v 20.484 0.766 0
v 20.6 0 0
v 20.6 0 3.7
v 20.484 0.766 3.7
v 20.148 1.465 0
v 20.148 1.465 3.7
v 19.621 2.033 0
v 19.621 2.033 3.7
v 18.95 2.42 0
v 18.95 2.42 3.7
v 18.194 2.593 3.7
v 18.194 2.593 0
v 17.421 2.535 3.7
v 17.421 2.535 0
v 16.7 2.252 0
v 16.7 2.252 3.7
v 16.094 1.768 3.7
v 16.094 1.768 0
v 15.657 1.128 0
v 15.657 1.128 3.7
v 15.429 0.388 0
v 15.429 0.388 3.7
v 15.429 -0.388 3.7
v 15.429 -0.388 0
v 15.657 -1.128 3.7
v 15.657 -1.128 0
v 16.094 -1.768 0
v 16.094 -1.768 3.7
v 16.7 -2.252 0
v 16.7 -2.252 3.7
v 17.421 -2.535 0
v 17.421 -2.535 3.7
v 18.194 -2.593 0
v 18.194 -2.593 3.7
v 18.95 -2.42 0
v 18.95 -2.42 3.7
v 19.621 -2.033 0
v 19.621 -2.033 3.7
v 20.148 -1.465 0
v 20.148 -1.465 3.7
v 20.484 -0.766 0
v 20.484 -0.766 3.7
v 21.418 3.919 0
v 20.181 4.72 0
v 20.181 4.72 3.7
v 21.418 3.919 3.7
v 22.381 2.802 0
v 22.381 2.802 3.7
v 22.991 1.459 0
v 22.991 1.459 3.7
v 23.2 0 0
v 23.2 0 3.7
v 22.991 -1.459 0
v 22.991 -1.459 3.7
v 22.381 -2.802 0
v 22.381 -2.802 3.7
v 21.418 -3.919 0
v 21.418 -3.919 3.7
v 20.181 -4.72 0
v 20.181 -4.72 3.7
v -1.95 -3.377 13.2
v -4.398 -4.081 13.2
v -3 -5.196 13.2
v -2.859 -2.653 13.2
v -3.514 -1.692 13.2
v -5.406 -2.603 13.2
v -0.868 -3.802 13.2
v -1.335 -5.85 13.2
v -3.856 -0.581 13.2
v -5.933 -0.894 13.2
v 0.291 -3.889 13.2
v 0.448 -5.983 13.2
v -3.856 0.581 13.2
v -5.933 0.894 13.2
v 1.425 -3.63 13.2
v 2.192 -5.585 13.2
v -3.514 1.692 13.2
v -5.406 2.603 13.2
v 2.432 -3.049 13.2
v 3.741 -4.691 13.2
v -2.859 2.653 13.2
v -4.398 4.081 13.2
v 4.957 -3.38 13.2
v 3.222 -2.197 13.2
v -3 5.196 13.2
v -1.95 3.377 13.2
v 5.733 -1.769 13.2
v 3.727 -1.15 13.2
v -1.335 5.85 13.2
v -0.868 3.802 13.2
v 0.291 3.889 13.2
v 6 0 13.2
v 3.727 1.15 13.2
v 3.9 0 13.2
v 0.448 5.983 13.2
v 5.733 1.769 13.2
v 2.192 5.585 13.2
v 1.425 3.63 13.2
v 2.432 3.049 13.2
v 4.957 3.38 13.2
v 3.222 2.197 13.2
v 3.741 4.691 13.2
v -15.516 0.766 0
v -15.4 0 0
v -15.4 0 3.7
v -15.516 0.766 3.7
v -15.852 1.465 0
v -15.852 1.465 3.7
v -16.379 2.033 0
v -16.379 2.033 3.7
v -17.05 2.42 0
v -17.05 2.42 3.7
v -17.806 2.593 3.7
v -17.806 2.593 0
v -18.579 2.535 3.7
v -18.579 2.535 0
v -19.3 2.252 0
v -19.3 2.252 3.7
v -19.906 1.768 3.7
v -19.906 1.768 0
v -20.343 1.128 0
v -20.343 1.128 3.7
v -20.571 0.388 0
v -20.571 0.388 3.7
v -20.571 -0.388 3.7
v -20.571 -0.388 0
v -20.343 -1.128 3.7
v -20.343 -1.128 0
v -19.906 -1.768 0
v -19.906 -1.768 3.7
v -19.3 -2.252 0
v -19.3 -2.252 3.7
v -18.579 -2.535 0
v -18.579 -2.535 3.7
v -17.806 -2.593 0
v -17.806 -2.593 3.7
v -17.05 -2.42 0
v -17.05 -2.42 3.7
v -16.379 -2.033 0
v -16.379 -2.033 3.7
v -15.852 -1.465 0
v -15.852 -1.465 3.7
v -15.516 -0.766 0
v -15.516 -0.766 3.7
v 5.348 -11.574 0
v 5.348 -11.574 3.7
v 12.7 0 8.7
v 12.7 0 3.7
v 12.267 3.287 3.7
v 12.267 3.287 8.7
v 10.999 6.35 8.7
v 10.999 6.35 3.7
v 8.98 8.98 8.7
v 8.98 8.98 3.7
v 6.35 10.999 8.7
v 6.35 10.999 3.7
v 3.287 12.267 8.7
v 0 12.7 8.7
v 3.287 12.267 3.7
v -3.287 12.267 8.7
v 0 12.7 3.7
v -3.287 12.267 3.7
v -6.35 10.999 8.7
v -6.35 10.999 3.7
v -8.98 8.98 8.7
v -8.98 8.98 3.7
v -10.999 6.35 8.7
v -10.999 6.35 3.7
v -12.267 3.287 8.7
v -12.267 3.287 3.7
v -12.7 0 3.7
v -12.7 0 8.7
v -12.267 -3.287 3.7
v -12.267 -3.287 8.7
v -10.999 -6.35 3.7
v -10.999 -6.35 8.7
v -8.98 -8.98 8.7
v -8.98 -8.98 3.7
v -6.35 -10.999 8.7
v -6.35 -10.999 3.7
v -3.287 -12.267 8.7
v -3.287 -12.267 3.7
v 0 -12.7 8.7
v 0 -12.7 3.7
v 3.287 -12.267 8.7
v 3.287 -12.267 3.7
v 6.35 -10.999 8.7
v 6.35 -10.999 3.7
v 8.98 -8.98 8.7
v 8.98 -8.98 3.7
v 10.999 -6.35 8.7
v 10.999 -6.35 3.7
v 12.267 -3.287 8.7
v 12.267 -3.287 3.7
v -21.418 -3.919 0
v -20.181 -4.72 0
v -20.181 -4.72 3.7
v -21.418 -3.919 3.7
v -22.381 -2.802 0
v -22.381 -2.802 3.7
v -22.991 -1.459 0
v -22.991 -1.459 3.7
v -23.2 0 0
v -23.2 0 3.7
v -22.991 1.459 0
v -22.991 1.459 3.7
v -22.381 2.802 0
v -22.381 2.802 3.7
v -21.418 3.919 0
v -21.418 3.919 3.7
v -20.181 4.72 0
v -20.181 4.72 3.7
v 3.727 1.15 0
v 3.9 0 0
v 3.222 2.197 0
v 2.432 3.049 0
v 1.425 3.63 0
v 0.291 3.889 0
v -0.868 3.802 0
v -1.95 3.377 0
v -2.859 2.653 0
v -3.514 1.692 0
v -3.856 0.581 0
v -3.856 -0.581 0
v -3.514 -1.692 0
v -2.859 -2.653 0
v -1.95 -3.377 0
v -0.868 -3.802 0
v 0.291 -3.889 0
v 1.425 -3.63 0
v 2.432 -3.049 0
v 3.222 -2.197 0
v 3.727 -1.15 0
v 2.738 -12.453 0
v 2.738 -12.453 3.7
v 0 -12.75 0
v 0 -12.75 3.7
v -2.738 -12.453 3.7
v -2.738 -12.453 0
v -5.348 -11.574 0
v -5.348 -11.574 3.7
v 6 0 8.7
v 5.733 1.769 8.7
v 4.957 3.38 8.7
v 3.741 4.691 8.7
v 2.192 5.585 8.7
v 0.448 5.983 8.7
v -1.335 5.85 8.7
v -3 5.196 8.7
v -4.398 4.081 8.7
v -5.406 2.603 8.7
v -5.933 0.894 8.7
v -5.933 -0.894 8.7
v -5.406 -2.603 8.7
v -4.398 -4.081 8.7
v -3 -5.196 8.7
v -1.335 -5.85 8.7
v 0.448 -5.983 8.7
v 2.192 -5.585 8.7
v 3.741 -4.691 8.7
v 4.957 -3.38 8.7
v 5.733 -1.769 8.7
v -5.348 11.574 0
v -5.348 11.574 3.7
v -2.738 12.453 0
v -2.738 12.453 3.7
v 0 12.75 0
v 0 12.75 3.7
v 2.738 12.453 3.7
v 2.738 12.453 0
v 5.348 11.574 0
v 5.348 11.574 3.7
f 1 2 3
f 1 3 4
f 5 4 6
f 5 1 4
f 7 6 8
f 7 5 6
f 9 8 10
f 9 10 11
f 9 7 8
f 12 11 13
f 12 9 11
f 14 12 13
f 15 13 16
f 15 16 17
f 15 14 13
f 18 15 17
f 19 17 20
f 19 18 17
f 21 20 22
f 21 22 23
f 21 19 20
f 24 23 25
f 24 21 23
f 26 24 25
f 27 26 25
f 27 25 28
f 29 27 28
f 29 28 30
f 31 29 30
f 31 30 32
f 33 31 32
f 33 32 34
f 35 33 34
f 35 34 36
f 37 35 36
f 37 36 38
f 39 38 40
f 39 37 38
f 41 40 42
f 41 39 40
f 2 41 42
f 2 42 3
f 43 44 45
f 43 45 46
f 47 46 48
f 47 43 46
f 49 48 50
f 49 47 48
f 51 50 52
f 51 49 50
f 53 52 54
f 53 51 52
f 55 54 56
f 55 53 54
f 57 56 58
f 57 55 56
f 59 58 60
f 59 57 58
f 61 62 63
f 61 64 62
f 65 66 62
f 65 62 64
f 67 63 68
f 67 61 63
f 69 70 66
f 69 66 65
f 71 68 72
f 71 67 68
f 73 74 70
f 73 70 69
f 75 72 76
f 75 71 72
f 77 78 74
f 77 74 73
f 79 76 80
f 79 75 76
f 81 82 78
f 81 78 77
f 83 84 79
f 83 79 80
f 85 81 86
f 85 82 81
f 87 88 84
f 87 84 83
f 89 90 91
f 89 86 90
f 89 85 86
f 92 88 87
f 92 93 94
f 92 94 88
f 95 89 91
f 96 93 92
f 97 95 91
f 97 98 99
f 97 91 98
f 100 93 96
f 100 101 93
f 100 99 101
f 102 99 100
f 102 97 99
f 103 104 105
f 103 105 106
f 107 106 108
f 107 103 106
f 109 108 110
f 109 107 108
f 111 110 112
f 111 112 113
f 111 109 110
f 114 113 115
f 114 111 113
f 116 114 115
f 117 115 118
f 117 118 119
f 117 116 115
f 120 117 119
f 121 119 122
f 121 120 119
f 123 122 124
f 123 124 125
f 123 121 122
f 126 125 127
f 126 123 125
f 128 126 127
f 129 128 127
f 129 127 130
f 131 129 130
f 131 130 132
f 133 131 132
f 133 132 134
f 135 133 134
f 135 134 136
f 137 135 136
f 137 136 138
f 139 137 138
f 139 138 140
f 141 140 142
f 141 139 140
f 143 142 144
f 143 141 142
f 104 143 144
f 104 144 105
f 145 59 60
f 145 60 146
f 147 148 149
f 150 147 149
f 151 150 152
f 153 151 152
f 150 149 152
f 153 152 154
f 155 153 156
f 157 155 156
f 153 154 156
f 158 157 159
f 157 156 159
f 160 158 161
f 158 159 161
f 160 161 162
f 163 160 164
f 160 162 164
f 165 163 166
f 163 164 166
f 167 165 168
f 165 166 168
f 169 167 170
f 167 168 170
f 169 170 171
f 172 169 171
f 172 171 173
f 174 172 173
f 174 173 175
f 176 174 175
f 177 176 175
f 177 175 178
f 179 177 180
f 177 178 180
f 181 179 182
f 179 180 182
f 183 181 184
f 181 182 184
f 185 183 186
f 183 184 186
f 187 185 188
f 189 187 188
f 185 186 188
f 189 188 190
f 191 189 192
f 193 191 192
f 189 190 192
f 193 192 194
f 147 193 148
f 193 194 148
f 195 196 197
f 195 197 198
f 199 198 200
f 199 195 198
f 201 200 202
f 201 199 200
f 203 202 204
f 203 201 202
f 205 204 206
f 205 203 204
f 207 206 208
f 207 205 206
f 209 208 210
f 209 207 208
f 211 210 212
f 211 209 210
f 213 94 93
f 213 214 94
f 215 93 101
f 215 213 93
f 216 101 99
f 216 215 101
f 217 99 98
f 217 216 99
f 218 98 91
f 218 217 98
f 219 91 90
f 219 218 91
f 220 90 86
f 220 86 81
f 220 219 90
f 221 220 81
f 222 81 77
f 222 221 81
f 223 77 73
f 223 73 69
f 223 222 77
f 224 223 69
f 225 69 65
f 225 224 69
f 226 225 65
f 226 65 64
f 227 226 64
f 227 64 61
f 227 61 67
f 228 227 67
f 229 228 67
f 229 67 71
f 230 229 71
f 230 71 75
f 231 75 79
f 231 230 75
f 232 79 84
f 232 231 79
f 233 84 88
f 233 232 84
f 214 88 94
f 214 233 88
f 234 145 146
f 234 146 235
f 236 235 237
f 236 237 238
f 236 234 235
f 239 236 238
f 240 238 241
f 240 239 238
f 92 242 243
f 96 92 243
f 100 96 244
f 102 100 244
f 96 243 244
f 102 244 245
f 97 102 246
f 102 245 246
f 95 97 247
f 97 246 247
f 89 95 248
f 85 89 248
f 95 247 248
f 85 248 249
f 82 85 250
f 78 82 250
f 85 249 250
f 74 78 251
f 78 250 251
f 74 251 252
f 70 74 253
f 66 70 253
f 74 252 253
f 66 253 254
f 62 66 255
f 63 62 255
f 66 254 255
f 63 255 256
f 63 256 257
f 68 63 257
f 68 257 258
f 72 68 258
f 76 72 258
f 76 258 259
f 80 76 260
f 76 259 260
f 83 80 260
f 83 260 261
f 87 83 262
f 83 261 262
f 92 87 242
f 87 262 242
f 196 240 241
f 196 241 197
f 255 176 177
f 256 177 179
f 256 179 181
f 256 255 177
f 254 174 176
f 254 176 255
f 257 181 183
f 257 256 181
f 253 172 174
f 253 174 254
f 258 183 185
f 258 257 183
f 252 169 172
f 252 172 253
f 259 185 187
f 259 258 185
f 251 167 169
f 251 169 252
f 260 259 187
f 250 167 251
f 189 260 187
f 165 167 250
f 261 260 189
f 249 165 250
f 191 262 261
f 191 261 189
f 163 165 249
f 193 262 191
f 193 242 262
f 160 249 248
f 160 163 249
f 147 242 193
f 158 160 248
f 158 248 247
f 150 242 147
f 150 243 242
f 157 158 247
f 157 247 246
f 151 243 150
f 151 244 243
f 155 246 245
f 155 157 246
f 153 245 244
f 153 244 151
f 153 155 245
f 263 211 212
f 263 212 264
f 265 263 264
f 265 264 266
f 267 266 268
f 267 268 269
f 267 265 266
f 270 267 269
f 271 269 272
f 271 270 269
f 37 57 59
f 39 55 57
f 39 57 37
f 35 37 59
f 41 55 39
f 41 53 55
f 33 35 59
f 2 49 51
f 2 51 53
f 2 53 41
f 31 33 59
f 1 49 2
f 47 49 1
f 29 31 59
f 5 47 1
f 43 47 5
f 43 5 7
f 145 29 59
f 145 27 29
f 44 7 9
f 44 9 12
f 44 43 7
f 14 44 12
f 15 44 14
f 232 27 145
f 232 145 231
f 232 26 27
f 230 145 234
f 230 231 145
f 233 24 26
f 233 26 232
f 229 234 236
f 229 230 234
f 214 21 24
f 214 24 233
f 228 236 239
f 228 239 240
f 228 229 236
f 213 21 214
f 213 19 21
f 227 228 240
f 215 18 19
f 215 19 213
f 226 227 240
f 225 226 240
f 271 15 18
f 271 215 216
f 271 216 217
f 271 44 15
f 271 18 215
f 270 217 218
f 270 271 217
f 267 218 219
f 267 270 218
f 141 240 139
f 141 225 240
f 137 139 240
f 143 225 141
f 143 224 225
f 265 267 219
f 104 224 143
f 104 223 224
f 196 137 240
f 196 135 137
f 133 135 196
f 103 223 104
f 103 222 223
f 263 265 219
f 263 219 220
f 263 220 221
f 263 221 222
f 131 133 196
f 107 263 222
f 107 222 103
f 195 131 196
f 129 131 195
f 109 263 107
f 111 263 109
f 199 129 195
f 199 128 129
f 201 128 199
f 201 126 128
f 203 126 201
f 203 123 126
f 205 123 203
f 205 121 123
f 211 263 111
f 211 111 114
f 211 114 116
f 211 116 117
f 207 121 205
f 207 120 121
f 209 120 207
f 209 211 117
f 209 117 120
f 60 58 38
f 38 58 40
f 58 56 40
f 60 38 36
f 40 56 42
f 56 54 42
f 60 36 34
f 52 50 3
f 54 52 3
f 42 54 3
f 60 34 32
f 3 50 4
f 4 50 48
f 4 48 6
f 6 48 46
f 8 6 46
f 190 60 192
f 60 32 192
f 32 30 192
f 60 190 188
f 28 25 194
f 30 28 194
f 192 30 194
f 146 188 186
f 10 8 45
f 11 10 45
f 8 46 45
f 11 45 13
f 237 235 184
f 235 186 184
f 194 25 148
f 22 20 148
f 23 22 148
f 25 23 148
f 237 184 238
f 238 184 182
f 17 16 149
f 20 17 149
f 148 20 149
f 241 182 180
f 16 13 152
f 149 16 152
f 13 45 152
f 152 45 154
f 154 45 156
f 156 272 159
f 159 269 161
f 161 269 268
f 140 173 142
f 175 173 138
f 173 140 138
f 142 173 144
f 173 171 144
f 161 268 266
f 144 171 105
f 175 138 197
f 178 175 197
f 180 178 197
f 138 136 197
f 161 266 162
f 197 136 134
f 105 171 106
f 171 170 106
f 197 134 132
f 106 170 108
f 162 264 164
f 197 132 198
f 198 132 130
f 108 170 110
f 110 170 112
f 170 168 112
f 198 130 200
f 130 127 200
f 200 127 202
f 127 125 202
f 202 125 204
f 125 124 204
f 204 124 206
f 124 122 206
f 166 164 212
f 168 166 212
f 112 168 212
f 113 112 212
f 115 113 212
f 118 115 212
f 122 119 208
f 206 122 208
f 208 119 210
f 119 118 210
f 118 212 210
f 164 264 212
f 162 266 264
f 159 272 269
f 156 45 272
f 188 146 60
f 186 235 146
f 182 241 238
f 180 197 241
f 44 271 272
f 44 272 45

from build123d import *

# Parameters (mm, degrees)
SKETCH_2_R      = 2.6
SKETCH_2_R_2    = 3.9
EXTRUDE_1_DEPTH = 3.7
SKETCH_3_R      = 12.7
SKETCH_3_R_2    = 3.9
EXTRUDE_2_DEPTH = 5
SKETCH_4_R      = 6
SKETCH_4_R_2    = 3.9
EXTRUDE_3_DEPTH = 4.5


with BuildPart() as part:
    # 草圖2 → 填料-伸長1 (new body)
    with BuildSketch(Plane.XY):
        with BuildLine():
            Line((-20.181106134, 4.72046354), (-5.347916667, 11.574207849))
            ThreePointArc((-5.347916667, 11.574207849), (0, 12.75), (5.347916667, 11.574207849))
            Line((5.347916667, 11.574207849), (20.181106134, 4.72046354))
            ThreePointArc((20.181106134, 4.72046354), (23.2, 0), (20.181106134, -4.72046354))
            Line((20.181106134, -4.72046354), (5.347916667, -11.574207849))
            ThreePointArc((5.347916667, -11.574207849), (0, -12.75), (-5.347916667, -11.574207849))
            Line((-5.347916667, -11.574207849), (-20.181106134, -4.72046354))
            ThreePointArc((-20.181106134, -4.72046354), (-23.2, 0), (-20.181106134, 4.72046354))
        make_face()
        with Locations((-18, 0)):
            Circle(SKETCH_2_R, mode=Mode.SUBTRACT)
        with Locations((18, 0)):
            Circle(SKETCH_2_R, mode=Mode.SUBTRACT)
        Circle(SKETCH_2_R_2, mode=Mode.SUBTRACT)
    extrude(amount=EXTRUDE_1_DEPTH)

    # 草圖3 → 填料-伸長2 (add)
    with BuildSketch(Plane.XY.offset(3.7)):
        Circle(SKETCH_3_R)
        Circle(SKETCH_3_R_2, mode=Mode.SUBTRACT)
    extrude(amount=EXTRUDE_2_DEPTH)

    # 草圖4 → 填料-伸長3 (add)
    with BuildSketch(Plane.XY.offset(8.7)):
        Circle(SKETCH_4_R)
        Circle(SKETCH_4_R_2, mode=Mode.SUBTRACT)
    extrude(amount=EXTRUDE_3_DEPTH)


solid = part.part
